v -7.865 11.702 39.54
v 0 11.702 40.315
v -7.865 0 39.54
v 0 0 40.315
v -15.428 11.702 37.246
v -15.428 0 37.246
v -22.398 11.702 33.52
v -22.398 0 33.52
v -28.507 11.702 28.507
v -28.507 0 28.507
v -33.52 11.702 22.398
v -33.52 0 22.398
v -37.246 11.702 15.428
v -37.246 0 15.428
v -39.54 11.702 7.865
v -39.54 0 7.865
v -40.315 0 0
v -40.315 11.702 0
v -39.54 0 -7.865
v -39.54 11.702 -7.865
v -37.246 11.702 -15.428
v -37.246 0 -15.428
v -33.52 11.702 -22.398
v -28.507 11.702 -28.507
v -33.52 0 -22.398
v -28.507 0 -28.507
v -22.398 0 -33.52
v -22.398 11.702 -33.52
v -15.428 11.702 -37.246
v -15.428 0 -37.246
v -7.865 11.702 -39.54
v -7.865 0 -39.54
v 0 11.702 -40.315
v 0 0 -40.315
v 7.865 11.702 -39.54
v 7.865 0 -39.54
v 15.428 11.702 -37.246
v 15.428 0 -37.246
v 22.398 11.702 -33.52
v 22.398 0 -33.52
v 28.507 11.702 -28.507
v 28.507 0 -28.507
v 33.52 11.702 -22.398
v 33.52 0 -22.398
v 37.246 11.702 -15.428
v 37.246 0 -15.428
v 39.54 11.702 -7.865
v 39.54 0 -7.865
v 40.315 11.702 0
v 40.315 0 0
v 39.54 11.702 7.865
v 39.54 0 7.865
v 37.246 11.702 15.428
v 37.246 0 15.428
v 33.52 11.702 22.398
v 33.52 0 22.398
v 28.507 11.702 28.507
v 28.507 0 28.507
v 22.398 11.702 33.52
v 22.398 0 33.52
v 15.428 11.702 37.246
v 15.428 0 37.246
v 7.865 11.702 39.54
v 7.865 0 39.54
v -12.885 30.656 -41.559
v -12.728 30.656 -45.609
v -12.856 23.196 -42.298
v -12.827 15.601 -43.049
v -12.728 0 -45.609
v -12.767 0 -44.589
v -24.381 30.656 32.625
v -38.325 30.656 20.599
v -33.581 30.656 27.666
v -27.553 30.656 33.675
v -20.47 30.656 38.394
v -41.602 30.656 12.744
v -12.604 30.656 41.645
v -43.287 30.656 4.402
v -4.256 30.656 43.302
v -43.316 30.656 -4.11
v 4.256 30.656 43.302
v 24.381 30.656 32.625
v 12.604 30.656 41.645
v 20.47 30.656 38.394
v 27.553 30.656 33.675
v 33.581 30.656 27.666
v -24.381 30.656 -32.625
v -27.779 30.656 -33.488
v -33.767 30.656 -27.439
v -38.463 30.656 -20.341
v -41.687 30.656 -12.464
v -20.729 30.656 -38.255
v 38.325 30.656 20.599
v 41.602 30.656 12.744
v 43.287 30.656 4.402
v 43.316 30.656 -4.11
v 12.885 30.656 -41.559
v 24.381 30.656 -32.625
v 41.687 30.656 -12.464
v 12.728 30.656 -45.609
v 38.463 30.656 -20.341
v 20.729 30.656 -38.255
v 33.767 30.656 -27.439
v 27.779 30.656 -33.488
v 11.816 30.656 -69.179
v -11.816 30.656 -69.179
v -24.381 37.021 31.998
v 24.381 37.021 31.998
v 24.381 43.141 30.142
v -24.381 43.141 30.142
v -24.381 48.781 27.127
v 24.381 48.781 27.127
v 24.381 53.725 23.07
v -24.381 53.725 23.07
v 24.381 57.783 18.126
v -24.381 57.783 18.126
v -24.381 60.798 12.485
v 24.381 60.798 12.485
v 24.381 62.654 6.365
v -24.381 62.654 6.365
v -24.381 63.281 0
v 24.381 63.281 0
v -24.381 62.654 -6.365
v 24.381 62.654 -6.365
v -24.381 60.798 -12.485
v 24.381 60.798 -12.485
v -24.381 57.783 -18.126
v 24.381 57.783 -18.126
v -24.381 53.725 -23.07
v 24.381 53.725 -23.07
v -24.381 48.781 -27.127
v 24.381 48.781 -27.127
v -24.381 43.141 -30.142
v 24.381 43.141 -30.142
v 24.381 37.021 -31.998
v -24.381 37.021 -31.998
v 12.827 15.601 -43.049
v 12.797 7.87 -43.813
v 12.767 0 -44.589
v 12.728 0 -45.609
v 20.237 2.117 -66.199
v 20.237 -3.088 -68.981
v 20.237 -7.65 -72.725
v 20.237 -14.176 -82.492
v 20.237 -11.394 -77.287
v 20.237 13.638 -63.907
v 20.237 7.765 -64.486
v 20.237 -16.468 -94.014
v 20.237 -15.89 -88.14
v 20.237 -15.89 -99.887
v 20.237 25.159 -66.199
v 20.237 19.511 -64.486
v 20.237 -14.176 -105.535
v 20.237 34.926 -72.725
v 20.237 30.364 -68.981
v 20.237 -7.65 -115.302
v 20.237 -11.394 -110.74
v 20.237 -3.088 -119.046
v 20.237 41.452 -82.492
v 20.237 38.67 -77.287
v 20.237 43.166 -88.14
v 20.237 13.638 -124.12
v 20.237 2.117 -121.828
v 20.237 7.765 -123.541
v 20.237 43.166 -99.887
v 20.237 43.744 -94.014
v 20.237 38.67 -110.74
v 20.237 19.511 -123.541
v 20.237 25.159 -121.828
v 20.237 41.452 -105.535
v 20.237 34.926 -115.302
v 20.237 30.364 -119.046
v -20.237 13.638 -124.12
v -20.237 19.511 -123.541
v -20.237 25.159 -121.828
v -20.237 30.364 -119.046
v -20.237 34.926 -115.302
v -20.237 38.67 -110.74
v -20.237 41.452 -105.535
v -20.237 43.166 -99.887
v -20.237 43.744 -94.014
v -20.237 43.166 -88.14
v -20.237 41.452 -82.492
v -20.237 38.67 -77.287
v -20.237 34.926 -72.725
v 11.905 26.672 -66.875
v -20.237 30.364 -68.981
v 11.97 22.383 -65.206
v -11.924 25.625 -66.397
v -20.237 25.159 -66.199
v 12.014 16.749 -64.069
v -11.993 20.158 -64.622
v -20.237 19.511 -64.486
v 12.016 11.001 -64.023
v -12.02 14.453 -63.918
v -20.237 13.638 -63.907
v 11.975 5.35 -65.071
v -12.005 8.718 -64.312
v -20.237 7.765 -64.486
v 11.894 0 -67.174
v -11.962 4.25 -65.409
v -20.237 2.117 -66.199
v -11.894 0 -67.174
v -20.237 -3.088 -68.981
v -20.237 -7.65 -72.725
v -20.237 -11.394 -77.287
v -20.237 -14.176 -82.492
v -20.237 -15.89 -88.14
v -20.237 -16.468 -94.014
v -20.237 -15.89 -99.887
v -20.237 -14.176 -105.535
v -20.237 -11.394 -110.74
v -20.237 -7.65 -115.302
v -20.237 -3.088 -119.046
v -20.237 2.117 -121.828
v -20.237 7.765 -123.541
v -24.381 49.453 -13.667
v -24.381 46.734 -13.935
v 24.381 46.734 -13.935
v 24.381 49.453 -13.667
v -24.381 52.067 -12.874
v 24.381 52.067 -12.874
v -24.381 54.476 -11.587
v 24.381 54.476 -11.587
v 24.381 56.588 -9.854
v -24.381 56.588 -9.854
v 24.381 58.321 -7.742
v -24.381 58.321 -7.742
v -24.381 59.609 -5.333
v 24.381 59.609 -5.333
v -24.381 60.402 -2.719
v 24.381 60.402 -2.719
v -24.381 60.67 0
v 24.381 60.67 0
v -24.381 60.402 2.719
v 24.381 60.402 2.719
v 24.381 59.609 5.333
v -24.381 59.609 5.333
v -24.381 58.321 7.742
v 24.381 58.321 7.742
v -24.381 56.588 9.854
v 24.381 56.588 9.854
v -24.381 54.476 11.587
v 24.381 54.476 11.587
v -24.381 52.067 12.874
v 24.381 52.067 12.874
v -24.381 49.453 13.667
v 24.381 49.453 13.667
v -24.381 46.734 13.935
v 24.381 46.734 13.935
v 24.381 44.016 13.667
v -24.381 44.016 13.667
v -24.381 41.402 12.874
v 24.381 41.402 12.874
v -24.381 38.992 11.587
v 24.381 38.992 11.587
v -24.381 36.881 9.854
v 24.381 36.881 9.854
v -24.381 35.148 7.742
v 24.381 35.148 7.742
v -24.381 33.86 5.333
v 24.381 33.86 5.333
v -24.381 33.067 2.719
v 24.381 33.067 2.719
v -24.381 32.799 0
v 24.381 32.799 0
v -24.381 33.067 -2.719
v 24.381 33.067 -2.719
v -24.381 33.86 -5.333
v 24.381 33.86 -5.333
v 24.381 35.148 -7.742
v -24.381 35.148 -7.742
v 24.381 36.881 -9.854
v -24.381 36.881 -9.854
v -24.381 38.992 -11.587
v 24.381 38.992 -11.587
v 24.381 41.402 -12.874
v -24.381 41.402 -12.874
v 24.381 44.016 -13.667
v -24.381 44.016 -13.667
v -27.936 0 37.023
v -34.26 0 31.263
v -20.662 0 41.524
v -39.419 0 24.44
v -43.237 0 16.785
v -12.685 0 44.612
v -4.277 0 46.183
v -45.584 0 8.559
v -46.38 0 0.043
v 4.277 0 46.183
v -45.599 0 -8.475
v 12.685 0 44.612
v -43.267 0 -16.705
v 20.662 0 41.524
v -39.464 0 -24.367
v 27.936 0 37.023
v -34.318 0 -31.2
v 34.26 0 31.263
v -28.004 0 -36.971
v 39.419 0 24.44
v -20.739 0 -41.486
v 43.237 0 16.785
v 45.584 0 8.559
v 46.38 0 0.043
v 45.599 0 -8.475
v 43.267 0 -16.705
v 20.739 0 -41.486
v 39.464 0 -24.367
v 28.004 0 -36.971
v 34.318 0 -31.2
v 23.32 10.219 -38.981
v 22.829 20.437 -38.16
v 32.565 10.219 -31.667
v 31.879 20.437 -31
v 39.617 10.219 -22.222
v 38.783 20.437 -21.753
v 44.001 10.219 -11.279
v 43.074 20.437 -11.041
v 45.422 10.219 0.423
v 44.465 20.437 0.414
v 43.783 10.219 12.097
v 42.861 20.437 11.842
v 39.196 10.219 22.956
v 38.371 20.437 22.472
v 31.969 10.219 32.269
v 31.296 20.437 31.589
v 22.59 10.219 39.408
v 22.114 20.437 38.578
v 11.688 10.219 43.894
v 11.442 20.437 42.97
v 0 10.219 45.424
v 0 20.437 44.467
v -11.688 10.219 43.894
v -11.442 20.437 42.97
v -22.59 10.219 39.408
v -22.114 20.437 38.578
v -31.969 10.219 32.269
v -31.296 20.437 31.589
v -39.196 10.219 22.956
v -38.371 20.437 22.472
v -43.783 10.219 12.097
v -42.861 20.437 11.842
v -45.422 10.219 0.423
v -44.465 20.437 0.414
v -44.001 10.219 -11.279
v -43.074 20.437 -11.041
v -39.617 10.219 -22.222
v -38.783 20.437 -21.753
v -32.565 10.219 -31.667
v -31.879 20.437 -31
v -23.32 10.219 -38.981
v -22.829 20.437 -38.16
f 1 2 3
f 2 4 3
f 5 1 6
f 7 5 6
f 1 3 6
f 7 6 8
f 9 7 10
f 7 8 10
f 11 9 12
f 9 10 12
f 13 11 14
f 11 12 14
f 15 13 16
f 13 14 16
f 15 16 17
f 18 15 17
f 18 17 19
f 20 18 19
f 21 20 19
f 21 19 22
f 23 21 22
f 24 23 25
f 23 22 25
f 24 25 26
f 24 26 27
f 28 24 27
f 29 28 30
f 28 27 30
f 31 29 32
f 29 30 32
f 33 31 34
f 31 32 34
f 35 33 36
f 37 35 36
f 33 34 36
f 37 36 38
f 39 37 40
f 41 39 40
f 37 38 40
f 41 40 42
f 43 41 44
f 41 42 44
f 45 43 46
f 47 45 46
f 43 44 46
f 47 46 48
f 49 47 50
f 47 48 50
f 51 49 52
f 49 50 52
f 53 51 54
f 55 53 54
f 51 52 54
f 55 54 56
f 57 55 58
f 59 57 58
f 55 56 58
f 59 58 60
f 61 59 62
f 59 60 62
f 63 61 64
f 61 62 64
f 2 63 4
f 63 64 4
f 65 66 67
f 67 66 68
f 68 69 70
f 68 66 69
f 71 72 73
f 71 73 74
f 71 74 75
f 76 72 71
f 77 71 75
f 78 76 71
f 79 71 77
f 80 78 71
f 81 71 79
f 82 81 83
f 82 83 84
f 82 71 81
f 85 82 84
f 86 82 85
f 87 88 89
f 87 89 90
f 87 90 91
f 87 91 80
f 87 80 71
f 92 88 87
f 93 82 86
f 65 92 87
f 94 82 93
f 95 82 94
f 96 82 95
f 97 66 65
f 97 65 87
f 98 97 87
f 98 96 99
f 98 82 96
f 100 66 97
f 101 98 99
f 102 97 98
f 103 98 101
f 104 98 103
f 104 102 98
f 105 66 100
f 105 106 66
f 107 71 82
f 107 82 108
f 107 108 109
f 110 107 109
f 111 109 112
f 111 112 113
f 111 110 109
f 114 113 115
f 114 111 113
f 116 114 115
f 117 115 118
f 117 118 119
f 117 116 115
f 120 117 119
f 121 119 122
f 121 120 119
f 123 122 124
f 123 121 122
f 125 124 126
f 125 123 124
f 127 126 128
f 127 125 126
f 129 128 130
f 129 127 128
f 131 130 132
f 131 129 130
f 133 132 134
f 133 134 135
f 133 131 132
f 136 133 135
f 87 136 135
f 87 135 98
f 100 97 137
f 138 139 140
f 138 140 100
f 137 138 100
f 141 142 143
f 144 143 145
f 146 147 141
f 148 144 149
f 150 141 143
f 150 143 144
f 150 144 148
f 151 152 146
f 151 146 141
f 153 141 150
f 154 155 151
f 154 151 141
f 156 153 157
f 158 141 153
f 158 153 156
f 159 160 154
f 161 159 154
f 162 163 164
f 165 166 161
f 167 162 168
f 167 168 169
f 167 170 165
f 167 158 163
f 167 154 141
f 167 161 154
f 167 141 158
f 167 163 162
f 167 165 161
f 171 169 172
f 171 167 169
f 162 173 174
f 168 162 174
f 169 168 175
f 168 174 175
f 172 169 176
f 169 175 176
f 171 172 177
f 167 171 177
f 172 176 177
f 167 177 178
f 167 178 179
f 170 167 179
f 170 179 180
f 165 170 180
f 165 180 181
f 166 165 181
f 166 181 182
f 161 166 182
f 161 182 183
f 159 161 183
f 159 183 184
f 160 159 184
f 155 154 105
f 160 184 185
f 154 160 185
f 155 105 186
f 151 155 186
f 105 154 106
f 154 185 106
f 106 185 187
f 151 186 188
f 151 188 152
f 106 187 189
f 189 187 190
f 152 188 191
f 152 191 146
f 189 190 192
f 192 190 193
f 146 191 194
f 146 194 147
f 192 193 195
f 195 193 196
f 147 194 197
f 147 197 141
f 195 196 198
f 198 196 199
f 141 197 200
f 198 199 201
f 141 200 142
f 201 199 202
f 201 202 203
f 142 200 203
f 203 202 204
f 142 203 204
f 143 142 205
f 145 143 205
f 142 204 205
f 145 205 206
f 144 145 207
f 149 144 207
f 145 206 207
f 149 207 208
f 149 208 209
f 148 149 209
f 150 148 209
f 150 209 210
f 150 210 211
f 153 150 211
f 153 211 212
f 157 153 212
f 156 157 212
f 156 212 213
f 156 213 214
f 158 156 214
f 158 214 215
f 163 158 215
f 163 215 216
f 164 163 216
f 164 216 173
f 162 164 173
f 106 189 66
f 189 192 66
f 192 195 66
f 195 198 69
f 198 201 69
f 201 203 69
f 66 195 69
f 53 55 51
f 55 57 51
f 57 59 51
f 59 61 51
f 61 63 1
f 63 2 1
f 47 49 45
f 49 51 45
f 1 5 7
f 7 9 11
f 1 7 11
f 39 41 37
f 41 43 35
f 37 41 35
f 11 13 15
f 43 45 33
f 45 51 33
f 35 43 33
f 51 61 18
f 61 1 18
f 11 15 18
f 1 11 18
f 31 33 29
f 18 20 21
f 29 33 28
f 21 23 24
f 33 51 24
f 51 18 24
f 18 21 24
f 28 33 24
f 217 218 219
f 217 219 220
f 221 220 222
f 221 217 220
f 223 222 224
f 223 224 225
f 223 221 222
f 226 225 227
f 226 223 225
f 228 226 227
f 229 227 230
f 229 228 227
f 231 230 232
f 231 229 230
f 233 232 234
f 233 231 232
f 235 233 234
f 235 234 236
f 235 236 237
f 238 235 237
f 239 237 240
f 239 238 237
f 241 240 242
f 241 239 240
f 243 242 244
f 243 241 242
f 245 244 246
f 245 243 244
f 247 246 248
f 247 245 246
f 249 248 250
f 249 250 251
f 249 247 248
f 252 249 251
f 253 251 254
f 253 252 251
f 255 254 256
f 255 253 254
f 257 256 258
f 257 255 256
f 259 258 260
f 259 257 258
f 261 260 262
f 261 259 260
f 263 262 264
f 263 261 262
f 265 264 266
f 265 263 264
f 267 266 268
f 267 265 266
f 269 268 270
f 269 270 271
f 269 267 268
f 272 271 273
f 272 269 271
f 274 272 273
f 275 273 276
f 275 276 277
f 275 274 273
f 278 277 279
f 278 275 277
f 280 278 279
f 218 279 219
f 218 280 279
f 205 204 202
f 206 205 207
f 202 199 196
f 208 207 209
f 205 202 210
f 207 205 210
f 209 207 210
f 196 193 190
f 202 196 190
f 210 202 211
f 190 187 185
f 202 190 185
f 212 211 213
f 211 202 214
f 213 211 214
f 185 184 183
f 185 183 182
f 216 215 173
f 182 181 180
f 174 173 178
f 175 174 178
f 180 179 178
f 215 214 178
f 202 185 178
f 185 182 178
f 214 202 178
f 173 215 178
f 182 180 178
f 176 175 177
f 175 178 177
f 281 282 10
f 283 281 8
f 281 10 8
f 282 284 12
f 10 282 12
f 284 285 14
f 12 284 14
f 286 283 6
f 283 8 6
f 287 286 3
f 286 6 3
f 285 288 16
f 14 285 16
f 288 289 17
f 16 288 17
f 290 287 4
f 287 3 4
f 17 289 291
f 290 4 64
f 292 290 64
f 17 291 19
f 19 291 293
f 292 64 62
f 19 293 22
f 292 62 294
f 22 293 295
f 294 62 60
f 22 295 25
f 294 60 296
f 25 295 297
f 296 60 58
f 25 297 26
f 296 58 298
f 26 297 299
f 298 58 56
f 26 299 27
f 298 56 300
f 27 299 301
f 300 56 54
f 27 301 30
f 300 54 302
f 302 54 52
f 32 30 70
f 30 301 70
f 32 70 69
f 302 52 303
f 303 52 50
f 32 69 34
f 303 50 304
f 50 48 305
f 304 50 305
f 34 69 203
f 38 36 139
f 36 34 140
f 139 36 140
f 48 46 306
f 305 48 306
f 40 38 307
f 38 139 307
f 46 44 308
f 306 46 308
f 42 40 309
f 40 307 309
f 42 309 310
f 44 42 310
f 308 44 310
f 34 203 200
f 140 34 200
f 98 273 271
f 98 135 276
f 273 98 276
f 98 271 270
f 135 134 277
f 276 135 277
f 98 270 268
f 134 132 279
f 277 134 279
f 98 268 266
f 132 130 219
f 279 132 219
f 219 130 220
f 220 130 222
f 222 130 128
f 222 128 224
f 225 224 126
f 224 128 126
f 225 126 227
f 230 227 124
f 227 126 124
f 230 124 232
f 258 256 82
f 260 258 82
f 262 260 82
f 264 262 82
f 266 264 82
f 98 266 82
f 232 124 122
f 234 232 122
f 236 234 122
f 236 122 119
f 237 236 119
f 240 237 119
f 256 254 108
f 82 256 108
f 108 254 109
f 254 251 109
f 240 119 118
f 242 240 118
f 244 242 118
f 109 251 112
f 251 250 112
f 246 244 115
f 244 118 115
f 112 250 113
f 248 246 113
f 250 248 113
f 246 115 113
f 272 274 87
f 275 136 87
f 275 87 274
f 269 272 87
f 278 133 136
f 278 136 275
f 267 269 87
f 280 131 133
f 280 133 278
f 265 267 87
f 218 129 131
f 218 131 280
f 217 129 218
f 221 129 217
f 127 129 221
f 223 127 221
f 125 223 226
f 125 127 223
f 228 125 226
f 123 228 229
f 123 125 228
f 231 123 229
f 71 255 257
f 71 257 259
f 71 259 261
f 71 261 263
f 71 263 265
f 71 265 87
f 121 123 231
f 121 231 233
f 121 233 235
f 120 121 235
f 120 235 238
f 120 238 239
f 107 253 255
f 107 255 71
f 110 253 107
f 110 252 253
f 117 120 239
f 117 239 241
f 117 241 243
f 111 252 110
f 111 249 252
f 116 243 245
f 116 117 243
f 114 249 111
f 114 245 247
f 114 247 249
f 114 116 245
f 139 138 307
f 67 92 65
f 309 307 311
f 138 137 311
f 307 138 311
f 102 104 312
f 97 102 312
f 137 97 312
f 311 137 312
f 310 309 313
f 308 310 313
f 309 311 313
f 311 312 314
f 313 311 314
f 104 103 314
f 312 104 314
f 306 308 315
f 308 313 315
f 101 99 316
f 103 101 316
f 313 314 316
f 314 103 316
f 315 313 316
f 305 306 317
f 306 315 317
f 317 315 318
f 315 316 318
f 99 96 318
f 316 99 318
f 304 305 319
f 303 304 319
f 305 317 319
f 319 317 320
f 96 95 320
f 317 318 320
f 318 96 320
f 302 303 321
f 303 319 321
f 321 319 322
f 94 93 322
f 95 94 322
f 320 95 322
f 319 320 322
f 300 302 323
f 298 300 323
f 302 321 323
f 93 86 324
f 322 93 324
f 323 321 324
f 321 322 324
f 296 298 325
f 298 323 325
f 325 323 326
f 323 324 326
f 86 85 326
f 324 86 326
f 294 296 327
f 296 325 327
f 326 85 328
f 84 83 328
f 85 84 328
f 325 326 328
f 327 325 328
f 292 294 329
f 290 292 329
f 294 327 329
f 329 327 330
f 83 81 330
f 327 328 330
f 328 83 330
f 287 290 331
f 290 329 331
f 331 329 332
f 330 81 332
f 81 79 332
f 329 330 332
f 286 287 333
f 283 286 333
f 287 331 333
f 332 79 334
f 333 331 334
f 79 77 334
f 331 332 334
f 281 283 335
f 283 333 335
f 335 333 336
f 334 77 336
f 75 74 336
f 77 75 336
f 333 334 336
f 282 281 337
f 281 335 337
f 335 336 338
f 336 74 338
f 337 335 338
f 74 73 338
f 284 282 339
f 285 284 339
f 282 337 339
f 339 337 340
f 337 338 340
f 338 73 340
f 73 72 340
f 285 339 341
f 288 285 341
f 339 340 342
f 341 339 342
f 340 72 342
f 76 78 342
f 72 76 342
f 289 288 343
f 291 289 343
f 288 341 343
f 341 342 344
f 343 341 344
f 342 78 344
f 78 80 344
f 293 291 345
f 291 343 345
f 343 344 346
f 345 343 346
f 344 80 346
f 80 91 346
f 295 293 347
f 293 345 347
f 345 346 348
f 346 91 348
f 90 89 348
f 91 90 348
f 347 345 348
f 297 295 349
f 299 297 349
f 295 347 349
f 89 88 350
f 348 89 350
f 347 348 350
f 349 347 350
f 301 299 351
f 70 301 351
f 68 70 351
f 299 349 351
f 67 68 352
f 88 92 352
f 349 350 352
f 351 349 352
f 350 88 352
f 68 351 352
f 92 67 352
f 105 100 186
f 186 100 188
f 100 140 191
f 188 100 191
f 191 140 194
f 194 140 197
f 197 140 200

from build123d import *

# Parameters (mm, degrees)
BOSS_EXTRUDE1_DEPTH      = 24.380571
BOSS_EXTRUDE1_DEPTH_BACK = 24.380571
SKETCH2_R                = 13.935202
BOSS_EXTRUDE2_DEPTH      = 30.655768
BOSS_EXTRUDE3_DEPTH      = 20.236561
BOSS_EXTRUDE3_DEPTH_BACK = 20.236561
SKETCH5_R                = 30.106112


with BuildPart() as part:
    # Sketch1 → Revolve1 (revolve)
    with BuildSketch(Plane.XY):
        Polygon((-40.3145498, 0), (-46.3804, 0), (-43.5102, 30.655768), (0, 30.655768), (0, 11.70178), (-40.3145498, 11.70178), align=None)
    revolve(axis=Axis((0, 0, 0), (0, -1, 0)))

    # Sketch2 → Boss-Extrude1 (add, two sides: drawn at the far end of the back side and taken through both)
    with BuildSketch(Plane(origin=(0, 0, 0), x_dir=(0, 0, -1), z_dir=(1, 0, 0)).offset(-BOSS_EXTRUDE1_DEPTH_BACK)):
        with BuildLine():
            Line((0, 30.655768), (-32.625284, 30.655768))
            ThreePointArc((-32.625284, 30.655768), (0, 63.281052), (32.625284, 30.655768))
            Line((32.625284, 30.655768), (0, 30.655768))
        make_face()
        with Locations((0, 46.734476)):
            Circle(SKETCH2_R, mode=Mode.SUBTRACT)
    extrude(amount=BOSS_EXTRUDE1_DEPTH + BOSS_EXTRUDE1_DEPTH_BACK)

    # Sketch4 → Boss-Extrude2 (add)
    with BuildSketch(Plane(origin=(0, 0, 0), x_dir=(1, 0, 0), z_dir=(0, 1, 0))):
        Polygon((12.72794, 45.609256), (10.780776, 95.954596), (-10.780776, 95.954596), (-12.72794, 45.609256), (-12.927645356, 40.445728926), (12.927645356, 40.445728926), align=None)
    extrude(amount=BOSS_EXTRUDE2_DEPTH)

    # Sketch5 → Boss-Extrude3 (add, two sides: drawn at the far end of the back side and taken through both)
    with BuildSketch(Plane(origin=(0, 0, 0), x_dir=(0, 0, -1), z_dir=(1, 0, 0)).offset(-BOSS_EXTRUDE3_DEPTH_BACK)):
        with Locations((94.013528, 13.638022)):
            Circle(SKETCH5_R)
    extrude(amount=BOSS_EXTRUDE3_DEPTH + BOSS_EXTRUDE3_DEPTH_BACK)


solid = part.part
